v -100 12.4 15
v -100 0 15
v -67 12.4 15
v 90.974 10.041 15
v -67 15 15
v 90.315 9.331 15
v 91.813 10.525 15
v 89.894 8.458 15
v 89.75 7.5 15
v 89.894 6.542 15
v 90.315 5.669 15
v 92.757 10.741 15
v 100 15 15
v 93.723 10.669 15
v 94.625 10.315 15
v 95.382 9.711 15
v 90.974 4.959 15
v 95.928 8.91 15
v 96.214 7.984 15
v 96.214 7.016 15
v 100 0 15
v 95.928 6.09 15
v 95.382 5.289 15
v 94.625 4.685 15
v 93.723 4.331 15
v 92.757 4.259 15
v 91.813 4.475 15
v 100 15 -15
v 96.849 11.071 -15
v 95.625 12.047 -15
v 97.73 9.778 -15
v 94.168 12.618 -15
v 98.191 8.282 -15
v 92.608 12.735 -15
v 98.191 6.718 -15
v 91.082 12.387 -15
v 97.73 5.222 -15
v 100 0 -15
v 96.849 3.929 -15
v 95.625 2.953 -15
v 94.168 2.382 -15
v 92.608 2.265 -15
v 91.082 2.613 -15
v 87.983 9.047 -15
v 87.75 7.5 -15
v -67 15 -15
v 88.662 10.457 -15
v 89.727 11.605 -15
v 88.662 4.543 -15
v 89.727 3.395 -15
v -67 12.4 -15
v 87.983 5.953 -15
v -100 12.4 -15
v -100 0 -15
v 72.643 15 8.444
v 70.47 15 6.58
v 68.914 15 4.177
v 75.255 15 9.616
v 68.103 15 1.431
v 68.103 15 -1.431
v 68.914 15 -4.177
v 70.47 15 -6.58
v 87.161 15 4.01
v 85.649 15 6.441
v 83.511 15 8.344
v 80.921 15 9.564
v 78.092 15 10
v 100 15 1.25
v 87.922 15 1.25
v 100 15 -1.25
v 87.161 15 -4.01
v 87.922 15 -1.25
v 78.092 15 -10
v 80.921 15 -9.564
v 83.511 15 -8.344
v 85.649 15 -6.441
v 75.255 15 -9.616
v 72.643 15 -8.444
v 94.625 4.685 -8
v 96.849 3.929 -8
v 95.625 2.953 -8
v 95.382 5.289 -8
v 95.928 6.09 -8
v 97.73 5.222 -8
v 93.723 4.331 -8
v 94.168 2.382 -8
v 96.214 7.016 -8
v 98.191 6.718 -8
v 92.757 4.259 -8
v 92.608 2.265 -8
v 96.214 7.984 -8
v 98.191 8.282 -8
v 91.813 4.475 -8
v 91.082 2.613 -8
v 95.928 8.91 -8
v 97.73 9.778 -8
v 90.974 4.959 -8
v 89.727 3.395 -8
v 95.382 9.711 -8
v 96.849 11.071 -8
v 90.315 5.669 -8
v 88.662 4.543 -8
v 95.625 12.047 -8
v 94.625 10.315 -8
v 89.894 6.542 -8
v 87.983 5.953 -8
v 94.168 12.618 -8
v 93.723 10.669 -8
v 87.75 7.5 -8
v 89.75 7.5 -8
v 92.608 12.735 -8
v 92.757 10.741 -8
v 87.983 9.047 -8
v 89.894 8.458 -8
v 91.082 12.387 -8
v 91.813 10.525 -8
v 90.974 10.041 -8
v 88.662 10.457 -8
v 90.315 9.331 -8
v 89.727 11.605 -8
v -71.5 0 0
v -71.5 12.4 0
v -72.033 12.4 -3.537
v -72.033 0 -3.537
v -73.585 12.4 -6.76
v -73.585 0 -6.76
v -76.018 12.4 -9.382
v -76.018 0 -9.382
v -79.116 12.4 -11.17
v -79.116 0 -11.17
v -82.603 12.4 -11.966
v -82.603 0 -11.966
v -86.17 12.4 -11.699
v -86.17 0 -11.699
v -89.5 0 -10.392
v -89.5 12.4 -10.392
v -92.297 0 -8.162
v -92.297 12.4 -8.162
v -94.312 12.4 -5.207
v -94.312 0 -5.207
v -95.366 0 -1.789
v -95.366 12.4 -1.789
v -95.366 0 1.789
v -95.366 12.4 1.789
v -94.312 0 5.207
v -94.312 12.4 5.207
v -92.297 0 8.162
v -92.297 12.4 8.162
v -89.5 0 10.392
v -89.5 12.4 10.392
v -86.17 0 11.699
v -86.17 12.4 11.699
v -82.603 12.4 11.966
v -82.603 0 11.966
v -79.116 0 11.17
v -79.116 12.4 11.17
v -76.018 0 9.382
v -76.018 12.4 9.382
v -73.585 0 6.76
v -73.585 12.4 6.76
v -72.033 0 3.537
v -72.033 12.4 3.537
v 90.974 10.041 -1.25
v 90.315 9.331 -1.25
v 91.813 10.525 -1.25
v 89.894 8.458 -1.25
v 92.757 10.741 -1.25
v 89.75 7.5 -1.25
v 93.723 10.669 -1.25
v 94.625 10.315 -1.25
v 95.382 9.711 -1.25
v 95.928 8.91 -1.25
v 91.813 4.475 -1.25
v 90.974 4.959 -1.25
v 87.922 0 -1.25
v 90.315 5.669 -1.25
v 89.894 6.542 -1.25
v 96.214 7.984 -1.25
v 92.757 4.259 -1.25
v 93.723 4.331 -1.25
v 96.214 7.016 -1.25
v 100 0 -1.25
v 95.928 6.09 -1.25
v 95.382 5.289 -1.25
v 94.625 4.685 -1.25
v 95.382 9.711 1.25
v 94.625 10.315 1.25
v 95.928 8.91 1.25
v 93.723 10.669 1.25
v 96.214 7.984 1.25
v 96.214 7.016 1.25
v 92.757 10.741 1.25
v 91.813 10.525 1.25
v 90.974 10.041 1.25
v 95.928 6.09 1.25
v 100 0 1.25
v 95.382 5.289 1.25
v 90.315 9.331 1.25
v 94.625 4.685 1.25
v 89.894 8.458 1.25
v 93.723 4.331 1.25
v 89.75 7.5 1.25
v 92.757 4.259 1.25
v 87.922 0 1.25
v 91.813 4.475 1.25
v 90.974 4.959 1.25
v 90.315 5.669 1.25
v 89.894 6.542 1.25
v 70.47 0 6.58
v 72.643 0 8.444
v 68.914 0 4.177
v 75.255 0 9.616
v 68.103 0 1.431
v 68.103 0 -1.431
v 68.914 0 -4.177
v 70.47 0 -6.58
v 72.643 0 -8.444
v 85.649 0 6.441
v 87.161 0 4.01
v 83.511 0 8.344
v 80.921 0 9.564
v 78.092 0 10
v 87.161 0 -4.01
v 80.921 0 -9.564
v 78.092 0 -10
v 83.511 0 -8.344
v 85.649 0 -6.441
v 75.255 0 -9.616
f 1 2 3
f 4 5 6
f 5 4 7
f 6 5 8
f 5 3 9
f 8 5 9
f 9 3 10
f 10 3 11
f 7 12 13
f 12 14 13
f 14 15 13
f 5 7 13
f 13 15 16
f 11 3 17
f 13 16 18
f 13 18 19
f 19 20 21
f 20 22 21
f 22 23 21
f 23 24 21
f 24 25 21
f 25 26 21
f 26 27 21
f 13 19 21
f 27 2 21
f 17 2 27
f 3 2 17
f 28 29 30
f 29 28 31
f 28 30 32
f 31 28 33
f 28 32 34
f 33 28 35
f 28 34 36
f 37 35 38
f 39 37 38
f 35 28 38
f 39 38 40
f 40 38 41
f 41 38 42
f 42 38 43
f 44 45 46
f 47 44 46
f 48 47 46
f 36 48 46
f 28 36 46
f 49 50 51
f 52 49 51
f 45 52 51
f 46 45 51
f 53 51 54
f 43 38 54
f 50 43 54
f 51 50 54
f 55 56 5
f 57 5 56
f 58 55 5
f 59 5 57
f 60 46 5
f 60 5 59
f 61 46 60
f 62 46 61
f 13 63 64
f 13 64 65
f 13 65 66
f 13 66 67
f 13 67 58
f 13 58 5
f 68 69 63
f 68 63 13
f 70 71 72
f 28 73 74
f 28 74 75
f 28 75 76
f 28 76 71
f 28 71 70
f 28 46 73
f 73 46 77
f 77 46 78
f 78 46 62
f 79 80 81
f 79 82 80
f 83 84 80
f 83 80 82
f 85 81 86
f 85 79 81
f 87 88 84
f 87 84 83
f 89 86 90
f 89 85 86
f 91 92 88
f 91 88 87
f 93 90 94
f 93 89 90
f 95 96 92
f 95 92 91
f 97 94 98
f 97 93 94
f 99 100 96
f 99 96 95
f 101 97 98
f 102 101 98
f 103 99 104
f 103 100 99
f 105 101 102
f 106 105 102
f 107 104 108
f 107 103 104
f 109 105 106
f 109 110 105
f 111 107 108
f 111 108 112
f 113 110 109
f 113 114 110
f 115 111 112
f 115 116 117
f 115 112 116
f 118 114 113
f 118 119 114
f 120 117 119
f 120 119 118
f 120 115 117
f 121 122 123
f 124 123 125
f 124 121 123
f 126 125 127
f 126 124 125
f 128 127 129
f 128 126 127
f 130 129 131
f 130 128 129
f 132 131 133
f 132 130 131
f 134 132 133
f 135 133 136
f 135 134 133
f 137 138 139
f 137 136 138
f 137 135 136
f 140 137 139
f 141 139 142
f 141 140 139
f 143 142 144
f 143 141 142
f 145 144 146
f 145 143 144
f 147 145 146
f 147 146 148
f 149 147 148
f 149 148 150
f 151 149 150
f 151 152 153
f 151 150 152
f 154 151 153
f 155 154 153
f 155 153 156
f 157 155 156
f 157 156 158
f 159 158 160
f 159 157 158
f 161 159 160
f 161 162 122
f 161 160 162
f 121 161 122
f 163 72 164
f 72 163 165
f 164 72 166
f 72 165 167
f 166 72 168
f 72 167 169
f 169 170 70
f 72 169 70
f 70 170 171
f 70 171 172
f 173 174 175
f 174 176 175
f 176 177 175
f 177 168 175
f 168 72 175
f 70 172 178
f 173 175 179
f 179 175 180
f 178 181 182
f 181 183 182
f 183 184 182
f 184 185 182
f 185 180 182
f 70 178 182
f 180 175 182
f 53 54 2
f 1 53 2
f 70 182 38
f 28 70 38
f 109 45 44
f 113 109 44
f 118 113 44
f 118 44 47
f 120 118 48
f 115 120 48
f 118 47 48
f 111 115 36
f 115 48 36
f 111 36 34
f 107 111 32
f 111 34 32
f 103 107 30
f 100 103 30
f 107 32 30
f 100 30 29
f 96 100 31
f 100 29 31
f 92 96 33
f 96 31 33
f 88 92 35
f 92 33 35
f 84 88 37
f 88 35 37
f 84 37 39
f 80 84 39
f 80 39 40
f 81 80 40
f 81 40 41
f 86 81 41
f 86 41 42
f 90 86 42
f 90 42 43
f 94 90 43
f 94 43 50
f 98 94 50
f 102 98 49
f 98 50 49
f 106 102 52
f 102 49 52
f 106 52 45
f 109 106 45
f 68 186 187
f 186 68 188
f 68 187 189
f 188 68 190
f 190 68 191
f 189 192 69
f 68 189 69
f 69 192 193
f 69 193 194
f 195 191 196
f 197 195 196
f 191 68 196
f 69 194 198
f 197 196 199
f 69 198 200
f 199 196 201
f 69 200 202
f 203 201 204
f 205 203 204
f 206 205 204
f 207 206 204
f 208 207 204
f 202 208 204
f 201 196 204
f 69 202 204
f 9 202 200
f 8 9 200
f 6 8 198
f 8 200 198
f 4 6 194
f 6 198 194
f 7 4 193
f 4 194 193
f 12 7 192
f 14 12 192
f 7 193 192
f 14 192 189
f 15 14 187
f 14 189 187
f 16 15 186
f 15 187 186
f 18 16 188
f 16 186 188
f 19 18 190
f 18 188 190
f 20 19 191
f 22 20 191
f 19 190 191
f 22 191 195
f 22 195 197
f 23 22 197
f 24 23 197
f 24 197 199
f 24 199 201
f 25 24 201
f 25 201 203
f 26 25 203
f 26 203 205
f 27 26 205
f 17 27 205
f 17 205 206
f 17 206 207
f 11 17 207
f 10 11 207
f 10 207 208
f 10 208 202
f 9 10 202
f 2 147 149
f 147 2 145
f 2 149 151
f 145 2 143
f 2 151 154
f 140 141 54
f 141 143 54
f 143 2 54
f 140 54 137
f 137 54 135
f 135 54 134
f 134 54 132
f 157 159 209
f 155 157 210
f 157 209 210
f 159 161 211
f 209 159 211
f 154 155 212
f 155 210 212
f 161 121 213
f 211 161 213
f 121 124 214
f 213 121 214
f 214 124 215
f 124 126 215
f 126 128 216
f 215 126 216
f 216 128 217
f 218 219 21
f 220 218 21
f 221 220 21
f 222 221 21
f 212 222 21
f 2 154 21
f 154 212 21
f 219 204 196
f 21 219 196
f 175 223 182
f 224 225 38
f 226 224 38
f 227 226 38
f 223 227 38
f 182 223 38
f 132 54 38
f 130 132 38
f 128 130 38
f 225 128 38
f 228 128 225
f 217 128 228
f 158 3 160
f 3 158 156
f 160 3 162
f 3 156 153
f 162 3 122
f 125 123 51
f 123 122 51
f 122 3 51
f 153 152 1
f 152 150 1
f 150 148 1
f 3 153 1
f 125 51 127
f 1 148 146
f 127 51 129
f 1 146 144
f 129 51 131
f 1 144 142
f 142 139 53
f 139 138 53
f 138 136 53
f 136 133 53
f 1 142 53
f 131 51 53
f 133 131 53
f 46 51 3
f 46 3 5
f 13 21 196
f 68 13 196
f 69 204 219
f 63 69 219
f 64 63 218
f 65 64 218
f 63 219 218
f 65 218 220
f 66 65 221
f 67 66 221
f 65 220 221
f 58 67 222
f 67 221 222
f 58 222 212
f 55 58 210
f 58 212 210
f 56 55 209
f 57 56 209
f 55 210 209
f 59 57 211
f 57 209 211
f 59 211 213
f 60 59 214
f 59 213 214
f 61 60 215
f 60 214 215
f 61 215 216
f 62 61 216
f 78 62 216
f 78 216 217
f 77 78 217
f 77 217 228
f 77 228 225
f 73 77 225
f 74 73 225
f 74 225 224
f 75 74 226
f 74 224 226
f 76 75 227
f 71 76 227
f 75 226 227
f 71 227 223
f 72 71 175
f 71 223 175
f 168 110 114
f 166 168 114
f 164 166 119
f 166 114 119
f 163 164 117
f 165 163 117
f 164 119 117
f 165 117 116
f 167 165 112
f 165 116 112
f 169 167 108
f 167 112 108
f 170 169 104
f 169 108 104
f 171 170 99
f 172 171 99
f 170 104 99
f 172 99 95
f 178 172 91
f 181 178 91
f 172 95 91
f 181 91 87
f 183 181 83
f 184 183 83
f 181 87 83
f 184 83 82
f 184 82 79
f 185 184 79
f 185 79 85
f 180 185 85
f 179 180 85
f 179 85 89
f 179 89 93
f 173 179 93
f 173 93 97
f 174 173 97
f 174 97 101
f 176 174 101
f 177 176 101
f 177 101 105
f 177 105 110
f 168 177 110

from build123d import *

# Parameters (mm, degrees)
SKETCH1_R           = 12
BOSS_EXTRUDE1_DEPTH = 15
SKETCH2_R           = 5.25
CUT_EXTRUDE1_DEPTH  = 7
SKETCH3_R           = 3.25
CUT_EXTRUDE2_DEPTH  = 24
SKETCH4_W           = 33
SKETCH4_H           = 2.6
CUT_EXTRUDE3_DEPTH  = 31


with BuildPart() as part:
    # Sketch1 → Boss-Extrude1 (new body)
    with BuildSketch(Plane(origin=(0, 0, 0), x_dir=(1, 0, 0), z_dir=(0, 1, 0))):
        with BuildLine():
            ThreePointArc((87.921567416, -1.25), (68, 0), (87.921567416, 1.25))
            Line((87.921567416, 1.25), (100, 1.25))
            Line((100, 1.25), (100, 15))
            Line((100, 15), (-100, 15))
            Line((-100, 15), (-100, -15))
            Line((-100, -15), (100, -15))
            Line((100, -15), (100, -1.25))
            Line((100, -1.25), (87.921567416, -1.25))
        make_face()
        with Locations((-83.5, 0)):
            Circle(SKETCH1_R, mode=Mode.SUBTRACT)
    extrude(amount=BOSS_EXTRUDE1_DEPTH)

    # Sketch2 → Cut-Extrude1 (cut)
    with BuildSketch(Plane(origin=(0, 0, -15), x_dir=(-1, 0, 0), z_dir=(0, 0, -1))):
        with Locations((-93, 7.5)):
            Circle(SKETCH2_R)
    extrude(amount=-CUT_EXTRUDE1_DEPTH, mode=Mode.SUBTRACT)

    # Sketch3 → Cut-Extrude2 (cut, through all)
    with BuildSketch(Plane(origin=(0, 0, -8), x_dir=(-1, 0, 0), z_dir=(0, 0, -1))):
        with Locations((-93, 7.5)):
            Circle(SKETCH3_R)
    extrude(amount=-CUT_EXTRUDE2_DEPTH, mode=Mode.SUBTRACT)

    # Sketch4 → Cut-Extrude3 (cut, through all)
    with BuildSketch(Plane(origin=(0, 0, -15), x_dir=(-1, 0, 0), z_dir=(0, 0, -1))):
        with Locations((83.5, 13.7)):
            Rectangle(SKETCH4_W, SKETCH4_H)
    extrude(amount=-CUT_EXTRUDE3_DEPTH, mode=Mode.SUBTRACT)


solid = part.part
